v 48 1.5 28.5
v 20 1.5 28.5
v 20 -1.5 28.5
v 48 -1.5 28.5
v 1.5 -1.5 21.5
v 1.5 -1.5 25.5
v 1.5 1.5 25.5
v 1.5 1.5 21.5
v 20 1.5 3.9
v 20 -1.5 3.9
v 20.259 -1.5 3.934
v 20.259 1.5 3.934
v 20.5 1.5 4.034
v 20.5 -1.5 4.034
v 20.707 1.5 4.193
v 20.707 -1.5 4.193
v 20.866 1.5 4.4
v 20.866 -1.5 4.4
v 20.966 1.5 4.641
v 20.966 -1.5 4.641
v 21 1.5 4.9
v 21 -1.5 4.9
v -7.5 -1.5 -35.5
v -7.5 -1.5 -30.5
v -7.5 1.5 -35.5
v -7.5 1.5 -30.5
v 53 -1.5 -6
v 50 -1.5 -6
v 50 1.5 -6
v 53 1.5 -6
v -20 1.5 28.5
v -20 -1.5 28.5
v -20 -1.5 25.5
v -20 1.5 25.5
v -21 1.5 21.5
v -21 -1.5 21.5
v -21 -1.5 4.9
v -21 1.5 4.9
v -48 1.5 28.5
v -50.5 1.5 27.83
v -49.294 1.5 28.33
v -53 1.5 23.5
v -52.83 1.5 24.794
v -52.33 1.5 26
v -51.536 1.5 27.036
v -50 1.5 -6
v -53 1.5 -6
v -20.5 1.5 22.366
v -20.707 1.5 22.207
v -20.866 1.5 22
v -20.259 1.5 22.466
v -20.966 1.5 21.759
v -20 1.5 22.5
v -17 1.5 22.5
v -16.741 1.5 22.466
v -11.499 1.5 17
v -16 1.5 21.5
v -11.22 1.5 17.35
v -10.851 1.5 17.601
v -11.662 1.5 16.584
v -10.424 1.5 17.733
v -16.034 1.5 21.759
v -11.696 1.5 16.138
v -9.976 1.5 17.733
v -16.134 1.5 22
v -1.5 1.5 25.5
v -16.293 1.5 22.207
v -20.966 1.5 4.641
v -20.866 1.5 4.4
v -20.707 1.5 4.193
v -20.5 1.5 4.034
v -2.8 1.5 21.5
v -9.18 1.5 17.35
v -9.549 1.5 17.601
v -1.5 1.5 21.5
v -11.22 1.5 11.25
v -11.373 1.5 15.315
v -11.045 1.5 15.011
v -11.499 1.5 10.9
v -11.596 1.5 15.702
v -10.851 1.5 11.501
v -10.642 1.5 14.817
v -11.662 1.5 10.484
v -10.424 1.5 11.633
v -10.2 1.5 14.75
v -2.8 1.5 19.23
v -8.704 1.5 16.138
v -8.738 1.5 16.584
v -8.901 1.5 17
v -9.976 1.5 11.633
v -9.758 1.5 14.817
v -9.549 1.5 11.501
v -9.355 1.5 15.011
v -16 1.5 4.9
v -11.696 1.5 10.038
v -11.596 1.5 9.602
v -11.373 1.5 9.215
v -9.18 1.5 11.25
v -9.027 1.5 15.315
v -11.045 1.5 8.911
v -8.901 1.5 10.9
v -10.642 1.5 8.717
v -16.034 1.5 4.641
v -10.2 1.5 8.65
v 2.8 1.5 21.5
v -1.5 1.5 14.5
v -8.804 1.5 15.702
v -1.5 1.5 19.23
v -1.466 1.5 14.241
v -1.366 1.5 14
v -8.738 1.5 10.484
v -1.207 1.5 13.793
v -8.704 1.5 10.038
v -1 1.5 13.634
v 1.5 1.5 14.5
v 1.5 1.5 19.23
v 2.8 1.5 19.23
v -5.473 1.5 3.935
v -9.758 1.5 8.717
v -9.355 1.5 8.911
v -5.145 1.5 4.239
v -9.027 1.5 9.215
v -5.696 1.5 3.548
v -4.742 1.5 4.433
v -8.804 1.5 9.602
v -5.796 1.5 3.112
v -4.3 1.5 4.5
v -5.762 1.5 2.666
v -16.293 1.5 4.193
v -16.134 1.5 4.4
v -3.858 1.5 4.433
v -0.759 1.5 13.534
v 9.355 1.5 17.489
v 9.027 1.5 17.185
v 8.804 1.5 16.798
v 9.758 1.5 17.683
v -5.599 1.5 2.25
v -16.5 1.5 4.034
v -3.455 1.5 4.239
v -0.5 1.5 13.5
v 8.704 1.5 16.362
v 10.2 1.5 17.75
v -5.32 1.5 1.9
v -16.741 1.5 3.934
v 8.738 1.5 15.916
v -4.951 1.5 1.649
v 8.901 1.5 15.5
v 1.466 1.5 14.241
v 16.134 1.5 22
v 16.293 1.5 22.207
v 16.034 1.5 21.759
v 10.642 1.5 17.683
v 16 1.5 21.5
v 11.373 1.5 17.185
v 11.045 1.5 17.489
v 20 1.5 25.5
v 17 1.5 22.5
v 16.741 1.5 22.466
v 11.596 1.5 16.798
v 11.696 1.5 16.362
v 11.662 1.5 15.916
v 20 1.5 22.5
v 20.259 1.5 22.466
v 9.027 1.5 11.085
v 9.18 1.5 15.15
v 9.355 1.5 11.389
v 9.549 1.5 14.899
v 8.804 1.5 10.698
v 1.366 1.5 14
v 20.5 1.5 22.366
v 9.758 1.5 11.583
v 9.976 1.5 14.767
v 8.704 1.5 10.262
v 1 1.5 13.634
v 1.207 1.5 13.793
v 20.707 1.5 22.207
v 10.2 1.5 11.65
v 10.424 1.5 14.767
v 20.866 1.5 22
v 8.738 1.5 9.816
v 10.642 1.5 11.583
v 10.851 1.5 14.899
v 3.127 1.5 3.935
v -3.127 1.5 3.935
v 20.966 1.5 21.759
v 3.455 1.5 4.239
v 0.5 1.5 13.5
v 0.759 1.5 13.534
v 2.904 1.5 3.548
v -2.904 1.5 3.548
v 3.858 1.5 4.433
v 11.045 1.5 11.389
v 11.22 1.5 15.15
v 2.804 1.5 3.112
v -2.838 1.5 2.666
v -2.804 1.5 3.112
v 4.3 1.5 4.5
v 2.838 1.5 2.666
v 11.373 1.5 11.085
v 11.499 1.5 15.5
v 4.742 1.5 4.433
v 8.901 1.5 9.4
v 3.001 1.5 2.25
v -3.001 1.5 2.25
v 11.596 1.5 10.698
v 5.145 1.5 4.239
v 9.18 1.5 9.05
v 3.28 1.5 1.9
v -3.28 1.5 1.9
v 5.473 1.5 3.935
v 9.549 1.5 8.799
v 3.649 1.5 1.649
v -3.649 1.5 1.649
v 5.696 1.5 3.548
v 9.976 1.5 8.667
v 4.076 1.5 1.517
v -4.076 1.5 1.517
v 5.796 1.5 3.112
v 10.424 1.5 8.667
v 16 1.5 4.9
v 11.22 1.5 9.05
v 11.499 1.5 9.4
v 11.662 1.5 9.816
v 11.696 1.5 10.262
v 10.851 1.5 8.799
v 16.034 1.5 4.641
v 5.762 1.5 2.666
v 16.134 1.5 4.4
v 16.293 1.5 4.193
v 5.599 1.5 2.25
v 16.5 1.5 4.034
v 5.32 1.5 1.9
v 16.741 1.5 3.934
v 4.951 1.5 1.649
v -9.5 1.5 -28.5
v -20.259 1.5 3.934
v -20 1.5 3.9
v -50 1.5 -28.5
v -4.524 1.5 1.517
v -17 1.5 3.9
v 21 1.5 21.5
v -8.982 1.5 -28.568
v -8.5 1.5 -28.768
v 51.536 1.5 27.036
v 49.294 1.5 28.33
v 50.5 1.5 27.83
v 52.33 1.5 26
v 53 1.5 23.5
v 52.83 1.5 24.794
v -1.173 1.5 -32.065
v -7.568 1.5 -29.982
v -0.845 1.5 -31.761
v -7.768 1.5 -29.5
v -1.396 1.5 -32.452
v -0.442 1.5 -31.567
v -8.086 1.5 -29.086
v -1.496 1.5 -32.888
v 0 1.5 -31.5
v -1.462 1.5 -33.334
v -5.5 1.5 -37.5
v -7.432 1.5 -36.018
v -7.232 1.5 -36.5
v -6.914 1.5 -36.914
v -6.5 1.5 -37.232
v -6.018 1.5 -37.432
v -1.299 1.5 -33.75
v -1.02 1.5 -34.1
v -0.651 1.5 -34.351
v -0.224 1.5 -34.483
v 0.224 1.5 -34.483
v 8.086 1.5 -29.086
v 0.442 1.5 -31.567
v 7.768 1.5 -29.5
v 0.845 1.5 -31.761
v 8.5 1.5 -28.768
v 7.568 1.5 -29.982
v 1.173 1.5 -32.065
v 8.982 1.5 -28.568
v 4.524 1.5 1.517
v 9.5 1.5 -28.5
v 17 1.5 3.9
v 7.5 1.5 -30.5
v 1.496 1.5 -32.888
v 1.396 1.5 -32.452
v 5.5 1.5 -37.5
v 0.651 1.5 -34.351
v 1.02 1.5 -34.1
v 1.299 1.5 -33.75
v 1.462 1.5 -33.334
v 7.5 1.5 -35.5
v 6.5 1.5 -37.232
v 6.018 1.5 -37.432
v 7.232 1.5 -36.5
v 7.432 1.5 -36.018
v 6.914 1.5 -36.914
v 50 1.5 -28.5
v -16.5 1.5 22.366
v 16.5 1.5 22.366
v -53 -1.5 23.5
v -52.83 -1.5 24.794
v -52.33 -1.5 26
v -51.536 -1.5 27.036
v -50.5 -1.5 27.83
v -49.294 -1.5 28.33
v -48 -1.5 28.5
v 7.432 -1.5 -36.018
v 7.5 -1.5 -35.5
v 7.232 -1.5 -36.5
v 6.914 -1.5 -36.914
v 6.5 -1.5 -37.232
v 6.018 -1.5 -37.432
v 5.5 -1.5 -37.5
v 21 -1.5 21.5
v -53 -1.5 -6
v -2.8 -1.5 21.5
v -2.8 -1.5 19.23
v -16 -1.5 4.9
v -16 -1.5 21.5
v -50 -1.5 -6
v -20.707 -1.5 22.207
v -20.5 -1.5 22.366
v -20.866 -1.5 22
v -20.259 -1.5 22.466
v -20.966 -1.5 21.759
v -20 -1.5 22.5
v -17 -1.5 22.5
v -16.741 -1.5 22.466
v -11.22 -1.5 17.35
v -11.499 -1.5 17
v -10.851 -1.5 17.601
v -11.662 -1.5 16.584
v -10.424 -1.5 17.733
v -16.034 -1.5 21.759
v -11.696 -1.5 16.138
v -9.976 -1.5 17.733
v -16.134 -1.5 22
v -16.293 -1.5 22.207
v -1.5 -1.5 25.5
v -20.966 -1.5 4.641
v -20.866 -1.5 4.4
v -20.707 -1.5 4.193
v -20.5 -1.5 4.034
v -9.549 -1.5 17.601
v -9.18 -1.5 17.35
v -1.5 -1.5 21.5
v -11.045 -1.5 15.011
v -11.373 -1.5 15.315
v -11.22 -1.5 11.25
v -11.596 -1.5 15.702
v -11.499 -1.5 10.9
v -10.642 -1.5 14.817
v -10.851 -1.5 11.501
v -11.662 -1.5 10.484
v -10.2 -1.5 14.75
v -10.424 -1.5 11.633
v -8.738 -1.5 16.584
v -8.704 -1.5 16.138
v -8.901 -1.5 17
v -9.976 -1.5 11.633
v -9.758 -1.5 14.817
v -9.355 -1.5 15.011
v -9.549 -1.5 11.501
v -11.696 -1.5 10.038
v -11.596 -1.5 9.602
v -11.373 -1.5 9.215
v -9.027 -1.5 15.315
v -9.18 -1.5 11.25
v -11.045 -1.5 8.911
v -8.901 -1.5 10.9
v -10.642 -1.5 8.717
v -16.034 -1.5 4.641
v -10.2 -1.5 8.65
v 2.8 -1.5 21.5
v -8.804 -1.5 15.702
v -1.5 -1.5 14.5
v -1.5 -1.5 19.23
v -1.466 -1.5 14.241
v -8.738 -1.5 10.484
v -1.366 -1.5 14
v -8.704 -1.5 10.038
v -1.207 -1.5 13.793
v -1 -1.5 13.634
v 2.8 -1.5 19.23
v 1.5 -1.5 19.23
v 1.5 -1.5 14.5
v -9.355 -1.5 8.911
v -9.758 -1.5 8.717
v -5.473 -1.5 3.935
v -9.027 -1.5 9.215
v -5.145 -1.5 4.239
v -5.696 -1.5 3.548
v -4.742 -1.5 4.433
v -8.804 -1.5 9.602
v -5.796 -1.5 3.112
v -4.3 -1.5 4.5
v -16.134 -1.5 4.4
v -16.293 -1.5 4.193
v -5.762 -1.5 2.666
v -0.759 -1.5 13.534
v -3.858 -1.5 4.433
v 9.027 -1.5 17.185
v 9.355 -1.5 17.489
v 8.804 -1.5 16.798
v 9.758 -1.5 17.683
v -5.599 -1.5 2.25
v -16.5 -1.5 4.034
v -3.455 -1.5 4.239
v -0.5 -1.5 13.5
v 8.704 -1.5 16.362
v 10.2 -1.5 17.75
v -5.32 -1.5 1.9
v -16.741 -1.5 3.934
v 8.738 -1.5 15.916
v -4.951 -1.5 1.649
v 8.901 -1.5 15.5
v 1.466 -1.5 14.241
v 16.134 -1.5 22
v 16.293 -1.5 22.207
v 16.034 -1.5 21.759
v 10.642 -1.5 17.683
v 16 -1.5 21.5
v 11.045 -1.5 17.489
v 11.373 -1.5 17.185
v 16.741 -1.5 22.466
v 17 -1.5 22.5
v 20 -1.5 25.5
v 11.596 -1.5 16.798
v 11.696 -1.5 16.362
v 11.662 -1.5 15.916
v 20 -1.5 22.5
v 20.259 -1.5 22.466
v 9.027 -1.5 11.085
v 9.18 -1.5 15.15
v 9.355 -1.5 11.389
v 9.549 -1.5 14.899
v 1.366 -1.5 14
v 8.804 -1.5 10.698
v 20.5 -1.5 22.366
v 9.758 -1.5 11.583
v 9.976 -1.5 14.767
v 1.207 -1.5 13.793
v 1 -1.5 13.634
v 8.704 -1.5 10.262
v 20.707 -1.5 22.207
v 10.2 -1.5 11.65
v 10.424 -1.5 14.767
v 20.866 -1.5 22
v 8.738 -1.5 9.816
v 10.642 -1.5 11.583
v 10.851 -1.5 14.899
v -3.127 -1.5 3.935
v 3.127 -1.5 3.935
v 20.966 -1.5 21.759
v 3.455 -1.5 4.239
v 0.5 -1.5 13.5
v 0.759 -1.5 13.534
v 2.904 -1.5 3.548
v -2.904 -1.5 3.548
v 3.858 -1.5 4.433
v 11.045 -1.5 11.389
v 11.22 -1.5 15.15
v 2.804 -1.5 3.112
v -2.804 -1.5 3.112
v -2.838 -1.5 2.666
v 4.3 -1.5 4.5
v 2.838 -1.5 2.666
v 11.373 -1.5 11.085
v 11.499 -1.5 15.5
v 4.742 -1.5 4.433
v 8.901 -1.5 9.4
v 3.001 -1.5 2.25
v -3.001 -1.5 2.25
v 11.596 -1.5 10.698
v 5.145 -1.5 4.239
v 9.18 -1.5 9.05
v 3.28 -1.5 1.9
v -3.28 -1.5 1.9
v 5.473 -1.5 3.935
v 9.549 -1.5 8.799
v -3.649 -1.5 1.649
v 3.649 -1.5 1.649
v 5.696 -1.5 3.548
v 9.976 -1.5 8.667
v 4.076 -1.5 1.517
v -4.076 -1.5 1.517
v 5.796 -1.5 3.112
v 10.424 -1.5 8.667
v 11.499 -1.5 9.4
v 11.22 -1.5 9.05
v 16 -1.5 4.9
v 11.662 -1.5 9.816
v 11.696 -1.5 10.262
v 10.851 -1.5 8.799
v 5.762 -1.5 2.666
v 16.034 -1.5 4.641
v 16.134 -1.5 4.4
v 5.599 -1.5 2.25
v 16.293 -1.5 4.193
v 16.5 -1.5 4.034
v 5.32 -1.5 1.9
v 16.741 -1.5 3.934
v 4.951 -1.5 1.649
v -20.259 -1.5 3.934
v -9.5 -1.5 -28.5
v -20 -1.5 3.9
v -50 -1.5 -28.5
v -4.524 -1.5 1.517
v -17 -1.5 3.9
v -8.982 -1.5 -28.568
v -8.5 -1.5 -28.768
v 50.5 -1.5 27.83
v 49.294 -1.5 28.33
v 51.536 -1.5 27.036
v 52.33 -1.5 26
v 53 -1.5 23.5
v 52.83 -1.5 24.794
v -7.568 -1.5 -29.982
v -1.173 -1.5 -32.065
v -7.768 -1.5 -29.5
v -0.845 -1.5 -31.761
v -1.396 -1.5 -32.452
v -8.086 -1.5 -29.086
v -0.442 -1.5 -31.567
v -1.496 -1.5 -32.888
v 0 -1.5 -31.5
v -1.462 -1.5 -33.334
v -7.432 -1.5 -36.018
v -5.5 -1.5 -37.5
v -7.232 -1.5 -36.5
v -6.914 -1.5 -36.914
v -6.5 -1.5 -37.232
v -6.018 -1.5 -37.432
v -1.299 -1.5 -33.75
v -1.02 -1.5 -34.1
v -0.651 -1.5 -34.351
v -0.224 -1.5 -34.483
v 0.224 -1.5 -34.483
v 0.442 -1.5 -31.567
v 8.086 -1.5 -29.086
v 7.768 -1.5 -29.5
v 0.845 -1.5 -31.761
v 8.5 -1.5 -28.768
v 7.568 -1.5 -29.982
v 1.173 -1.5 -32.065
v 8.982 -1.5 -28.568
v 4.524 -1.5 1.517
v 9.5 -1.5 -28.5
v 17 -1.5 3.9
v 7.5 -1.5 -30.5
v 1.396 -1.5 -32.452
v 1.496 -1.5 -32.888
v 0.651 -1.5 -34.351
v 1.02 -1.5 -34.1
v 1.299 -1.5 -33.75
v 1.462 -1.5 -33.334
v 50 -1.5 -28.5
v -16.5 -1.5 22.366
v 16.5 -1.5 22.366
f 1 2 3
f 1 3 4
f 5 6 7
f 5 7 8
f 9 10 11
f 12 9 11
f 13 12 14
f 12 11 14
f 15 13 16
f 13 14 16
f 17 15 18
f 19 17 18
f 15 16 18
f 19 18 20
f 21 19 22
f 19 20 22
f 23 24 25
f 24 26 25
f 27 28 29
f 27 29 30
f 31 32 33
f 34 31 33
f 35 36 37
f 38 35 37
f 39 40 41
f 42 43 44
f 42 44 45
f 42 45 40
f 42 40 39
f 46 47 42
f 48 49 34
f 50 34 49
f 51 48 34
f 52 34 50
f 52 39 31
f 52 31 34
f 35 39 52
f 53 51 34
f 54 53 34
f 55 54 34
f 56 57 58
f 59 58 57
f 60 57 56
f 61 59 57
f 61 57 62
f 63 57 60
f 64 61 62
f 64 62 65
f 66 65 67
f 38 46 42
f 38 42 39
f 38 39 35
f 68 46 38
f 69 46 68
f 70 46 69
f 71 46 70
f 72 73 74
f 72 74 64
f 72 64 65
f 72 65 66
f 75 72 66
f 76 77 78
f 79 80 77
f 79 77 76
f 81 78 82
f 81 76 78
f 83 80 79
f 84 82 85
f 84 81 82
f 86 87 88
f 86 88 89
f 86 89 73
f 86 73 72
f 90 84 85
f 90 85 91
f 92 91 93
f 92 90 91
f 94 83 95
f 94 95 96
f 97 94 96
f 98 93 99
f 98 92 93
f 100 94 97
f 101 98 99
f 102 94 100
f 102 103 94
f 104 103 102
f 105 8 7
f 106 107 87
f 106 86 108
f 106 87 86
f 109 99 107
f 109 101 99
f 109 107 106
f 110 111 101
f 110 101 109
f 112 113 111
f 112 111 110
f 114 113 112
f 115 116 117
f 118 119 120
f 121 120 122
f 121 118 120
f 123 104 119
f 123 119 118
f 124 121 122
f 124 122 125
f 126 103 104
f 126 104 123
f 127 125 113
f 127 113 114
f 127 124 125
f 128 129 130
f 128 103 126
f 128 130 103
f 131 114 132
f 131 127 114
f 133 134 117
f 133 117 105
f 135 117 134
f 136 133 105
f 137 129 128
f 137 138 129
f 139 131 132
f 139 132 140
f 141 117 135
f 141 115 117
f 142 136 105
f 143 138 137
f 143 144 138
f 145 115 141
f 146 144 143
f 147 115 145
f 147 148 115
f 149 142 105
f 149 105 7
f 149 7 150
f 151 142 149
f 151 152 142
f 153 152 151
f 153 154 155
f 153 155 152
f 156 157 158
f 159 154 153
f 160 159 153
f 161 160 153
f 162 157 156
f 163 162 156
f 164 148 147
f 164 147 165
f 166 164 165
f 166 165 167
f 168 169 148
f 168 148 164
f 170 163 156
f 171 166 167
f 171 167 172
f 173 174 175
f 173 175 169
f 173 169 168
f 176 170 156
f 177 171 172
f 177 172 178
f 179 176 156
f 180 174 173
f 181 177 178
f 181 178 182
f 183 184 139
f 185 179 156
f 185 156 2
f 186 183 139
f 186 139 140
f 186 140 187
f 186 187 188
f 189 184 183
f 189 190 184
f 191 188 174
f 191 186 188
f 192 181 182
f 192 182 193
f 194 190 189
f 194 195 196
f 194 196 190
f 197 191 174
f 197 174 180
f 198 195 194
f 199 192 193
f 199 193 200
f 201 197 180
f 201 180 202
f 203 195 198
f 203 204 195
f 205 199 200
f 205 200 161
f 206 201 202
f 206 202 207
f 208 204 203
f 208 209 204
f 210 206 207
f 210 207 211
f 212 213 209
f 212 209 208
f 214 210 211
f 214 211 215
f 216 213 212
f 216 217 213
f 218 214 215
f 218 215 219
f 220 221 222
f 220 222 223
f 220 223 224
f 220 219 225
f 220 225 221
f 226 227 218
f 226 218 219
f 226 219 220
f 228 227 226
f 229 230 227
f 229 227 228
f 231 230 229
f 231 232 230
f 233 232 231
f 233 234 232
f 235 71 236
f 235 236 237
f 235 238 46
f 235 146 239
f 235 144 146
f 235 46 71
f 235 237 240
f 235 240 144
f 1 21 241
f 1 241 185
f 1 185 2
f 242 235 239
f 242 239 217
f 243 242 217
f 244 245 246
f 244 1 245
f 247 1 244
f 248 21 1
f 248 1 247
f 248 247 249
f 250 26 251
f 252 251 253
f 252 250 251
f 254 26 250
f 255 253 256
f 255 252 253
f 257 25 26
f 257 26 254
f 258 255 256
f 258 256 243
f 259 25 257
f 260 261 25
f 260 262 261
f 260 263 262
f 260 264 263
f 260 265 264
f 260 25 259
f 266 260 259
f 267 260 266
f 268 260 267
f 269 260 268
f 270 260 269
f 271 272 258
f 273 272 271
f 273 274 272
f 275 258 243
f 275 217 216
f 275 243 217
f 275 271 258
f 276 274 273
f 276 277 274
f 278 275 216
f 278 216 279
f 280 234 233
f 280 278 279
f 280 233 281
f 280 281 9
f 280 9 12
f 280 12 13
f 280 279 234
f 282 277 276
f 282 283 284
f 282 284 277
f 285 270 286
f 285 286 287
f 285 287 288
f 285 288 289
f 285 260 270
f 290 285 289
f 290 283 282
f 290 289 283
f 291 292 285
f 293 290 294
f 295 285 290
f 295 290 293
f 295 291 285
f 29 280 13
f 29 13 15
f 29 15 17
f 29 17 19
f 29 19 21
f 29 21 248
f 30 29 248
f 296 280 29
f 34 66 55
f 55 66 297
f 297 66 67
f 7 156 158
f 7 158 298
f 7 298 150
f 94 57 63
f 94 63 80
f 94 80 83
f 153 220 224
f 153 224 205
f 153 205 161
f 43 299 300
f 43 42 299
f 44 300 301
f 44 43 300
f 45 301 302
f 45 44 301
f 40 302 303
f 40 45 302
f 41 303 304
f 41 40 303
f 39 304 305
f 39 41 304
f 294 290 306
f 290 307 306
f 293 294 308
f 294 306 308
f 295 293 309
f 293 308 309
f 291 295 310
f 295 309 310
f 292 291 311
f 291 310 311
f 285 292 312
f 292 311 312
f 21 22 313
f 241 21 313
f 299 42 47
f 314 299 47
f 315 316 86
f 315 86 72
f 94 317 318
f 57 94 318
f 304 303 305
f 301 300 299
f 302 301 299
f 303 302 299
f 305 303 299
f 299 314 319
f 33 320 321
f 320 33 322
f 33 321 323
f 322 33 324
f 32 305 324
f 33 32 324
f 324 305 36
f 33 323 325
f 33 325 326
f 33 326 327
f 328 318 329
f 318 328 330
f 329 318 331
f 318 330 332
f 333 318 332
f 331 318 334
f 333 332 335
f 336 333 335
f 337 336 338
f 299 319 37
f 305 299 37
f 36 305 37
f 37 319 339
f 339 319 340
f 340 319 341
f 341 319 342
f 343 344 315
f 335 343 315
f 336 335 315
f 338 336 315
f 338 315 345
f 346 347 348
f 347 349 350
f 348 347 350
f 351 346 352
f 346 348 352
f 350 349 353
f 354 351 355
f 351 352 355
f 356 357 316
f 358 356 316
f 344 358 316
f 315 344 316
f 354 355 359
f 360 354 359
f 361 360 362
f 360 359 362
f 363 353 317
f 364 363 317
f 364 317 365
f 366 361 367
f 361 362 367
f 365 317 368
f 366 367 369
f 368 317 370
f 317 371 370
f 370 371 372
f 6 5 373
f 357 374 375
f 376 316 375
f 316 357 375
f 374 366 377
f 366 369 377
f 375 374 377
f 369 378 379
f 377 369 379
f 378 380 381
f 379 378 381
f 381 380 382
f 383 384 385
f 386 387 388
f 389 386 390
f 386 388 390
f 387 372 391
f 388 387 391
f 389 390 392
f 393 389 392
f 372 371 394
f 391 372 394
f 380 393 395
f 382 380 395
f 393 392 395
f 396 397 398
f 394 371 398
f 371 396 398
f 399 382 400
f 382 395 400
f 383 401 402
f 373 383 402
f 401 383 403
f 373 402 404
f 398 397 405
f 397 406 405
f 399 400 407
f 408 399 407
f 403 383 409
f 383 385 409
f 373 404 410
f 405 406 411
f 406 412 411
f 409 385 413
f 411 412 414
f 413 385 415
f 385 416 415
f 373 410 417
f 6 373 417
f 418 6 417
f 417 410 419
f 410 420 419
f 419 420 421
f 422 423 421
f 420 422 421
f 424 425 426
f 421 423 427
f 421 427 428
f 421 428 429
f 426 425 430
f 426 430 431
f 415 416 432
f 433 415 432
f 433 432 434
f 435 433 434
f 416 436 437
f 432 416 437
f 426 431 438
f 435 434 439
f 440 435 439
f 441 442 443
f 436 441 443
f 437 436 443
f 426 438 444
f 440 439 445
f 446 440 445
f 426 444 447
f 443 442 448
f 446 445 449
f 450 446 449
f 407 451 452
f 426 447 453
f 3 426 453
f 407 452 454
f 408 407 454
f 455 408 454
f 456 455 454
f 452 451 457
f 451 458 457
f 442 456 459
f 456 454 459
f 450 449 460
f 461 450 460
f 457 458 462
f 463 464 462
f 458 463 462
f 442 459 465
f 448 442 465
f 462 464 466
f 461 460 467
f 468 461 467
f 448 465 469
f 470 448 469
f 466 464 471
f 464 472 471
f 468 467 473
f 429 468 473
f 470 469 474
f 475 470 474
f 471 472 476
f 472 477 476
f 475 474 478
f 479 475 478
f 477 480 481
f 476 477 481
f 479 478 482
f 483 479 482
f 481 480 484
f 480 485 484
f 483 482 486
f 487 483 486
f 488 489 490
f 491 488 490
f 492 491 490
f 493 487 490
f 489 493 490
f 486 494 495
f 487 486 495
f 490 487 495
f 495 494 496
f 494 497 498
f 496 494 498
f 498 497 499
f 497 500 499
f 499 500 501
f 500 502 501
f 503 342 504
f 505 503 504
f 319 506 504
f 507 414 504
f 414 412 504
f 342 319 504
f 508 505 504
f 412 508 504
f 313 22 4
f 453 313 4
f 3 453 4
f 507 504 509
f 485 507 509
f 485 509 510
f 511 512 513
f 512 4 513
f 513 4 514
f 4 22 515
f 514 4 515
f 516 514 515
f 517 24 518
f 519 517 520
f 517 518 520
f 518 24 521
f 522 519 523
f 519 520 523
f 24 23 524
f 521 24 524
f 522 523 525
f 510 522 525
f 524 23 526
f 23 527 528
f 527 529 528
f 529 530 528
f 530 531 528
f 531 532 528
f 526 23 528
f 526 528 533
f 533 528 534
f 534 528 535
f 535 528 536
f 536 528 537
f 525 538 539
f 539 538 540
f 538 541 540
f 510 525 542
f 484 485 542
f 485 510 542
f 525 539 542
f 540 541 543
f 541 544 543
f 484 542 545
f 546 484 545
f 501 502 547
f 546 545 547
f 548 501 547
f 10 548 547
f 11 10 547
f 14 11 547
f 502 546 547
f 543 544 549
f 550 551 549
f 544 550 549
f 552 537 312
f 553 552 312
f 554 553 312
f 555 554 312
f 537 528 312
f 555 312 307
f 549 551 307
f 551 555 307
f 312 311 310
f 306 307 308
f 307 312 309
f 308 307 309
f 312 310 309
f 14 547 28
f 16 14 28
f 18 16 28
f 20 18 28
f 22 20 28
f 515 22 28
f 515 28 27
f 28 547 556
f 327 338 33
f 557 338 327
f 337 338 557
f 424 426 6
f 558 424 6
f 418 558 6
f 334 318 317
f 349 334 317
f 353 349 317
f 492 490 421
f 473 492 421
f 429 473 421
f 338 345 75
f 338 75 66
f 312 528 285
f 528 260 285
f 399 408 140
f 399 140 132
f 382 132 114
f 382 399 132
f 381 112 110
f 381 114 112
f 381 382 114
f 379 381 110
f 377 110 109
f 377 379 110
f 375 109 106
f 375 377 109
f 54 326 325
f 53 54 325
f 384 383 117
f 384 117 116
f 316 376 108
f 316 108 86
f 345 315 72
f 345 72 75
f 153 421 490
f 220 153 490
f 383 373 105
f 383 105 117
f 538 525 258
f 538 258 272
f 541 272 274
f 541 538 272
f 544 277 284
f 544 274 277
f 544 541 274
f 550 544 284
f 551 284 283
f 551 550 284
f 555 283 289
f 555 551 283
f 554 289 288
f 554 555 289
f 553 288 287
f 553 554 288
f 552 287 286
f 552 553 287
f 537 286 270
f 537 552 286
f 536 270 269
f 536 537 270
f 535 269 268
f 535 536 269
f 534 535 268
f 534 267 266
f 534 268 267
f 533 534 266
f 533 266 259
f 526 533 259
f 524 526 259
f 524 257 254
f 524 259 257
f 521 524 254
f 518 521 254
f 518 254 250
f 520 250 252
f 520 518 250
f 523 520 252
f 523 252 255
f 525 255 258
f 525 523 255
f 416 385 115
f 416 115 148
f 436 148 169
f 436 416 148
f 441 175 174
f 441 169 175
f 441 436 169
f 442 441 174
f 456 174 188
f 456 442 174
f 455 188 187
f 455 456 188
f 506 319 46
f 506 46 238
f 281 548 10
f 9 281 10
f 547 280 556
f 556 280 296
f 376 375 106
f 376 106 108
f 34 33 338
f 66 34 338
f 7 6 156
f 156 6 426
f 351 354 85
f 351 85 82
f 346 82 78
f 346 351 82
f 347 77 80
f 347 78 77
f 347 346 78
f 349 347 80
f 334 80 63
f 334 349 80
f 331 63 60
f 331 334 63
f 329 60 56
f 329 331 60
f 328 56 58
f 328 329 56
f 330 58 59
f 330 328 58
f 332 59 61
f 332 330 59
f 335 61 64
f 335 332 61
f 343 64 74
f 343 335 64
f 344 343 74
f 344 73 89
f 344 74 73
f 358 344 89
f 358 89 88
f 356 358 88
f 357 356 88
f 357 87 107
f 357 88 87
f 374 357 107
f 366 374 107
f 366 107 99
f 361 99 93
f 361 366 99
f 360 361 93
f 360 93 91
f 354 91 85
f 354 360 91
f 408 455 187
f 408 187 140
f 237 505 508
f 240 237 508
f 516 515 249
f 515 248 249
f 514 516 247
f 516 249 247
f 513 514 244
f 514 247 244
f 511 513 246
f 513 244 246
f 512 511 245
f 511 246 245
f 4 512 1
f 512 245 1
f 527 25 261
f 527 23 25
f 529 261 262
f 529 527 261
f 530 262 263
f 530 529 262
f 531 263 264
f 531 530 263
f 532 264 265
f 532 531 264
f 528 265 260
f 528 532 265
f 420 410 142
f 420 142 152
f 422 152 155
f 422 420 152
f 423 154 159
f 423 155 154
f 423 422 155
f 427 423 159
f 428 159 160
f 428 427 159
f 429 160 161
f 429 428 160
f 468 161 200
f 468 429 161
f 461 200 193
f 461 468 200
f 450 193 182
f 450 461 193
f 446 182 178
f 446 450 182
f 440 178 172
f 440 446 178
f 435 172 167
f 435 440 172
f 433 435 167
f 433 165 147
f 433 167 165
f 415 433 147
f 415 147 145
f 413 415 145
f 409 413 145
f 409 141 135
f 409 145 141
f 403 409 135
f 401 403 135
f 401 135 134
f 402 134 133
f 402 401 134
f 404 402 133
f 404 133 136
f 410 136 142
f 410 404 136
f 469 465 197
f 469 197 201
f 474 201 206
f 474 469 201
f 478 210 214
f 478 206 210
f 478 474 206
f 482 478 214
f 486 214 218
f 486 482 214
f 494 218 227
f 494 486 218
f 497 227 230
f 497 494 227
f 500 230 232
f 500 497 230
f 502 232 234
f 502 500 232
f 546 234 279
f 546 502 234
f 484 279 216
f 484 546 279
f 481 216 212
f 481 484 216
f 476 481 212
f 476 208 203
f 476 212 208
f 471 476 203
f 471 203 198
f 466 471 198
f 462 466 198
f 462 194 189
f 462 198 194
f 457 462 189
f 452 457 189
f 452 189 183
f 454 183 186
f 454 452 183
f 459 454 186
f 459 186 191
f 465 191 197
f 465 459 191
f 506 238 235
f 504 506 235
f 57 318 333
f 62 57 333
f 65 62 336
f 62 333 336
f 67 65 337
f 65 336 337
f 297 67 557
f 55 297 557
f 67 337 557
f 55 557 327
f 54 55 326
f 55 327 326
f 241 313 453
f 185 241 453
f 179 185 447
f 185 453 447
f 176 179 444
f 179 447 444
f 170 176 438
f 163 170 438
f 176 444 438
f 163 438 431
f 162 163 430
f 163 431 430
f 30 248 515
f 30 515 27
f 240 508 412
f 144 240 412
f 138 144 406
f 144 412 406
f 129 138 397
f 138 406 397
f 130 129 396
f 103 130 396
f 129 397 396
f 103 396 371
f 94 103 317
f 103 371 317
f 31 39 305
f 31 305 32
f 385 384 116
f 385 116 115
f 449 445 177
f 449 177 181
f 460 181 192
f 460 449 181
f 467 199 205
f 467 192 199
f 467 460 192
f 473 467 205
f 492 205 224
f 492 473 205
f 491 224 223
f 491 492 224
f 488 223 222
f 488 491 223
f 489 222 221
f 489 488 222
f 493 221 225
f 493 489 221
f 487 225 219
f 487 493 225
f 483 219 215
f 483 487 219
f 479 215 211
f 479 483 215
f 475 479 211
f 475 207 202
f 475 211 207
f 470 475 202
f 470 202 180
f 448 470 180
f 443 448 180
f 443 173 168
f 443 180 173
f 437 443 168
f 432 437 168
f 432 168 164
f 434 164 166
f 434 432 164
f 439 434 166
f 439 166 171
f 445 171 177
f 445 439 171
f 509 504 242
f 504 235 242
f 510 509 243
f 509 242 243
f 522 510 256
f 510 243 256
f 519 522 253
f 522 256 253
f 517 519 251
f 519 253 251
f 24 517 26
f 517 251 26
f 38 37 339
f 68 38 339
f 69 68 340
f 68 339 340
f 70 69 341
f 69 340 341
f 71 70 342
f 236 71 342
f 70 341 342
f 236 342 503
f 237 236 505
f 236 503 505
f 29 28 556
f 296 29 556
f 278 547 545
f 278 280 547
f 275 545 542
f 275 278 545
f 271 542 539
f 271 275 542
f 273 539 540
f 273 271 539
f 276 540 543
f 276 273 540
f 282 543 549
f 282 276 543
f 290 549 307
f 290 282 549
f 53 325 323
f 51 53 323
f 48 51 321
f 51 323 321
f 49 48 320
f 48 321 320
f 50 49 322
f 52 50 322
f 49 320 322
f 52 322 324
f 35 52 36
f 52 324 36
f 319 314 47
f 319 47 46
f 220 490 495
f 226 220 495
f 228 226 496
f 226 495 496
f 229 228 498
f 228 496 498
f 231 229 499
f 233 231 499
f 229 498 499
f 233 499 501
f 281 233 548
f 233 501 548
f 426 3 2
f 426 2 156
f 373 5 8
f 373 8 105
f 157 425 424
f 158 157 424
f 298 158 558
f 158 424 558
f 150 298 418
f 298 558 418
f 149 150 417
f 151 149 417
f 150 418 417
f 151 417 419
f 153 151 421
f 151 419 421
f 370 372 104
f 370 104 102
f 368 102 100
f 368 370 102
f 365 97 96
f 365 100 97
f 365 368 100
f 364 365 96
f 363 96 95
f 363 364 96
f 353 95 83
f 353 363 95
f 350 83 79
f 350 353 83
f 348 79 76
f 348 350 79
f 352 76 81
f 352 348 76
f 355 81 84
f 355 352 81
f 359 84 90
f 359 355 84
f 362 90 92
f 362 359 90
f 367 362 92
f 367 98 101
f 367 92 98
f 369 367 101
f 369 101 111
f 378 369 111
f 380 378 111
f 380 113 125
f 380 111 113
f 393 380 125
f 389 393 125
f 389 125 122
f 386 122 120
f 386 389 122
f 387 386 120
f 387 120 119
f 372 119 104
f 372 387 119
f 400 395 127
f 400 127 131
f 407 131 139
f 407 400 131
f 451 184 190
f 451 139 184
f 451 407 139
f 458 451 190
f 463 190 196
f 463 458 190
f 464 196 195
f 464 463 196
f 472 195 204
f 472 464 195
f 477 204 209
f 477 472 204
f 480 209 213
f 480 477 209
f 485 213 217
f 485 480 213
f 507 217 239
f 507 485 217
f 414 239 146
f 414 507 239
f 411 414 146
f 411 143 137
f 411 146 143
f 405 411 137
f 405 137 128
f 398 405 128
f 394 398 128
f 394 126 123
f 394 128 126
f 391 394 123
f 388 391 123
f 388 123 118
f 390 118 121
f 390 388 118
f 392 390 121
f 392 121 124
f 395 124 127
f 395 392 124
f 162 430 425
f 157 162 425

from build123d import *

# Parameters (mm, degrees)
SKETCH1_W                  = 106
SKETCH1_H                  = 57
BOSS_EXTRUDE1_DEPTH        = 1.5
CUT_EXTRUDE1_DEPTH         = 61.195514783
CUT_EXTRUDE1_DEPTH_BACK    = 61.195514783
SKETCH2_W                  = 3
SKETCH2_H                  = 22.5
SKETCH2_W_2                = 40
SKETCH2_H_2                = 3
SKETCH4_W                  = 15
SKETCH4_H                  = 9
BOSS_EXTRUDE2_DEPTH        = 1.5
FILLET1_R                  = 2
CUT_EXTRUDE2_DEPTH         = 65.942282066
CUT_EXTRUDE2_DEPTH_BACK    = 65.942282066
CUT_EXTRUDE3_DEPTH         = 65.942282066
CUT_EXTRUDE3_DEPTH_BACK    = 65.942282066
SKETCH5_R                  = 1.5
FILLET2_R                  = 5
CUT_EXTRUDE4_DEPTH         = 65.942282066
CUT_EXTRUDE4_DEPTH_BACK    = 65.942282066
SKETCH6_R                  = 1.5
CORTE_EXTRUS_O1_DEPTH      = 65.994230513
CORTE_EXTRUS_O1_DEPTH_BACK = 65.994230513


with BuildPart() as part:
    # Sketch1 → Boss-Extrude1 (new, symmetric)
    with BuildSketch(Plane(origin=(0, 0, 0), x_dir=(1, 0, 0), z_dir=(0, 1, 0))):
        Rectangle(SKETCH1_W, SKETCH1_H)
    extrude(amount=BOSS_EXTRUDE1_DEPTH, both=True)

    # Sketch2 → Cut-Extrude1 (cut, two sides: drawn at the far end of the back side and taken through both)
    with BuildSketch(Plane(origin=(0, 0, 0), x_dir=(1, 0, 0), z_dir=(0, 1, 0)).offset(-CUT_EXTRUDE1_DEPTH_BACK)):
        with Locations((-51.5, 17.25)):
            Rectangle(SKETCH2_W, SKETCH2_H)
        with Locations((51.5, 17.25)):
            Rectangle(SKETCH2_W, SKETCH2_H)
        with Locations((0, -27)):
            Rectangle(SKETCH2_W_2, SKETCH2_H_2)
    extrude(amount=CUT_EXTRUDE1_DEPTH + CUT_EXTRUDE1_DEPTH_BACK, mode=Mode.SUBTRACT)

    # Sketch4 → Boss-Extrude2 (add, symmetric)
    with BuildSketch(Plane(origin=(0, 0, 0), x_dir=(1, 0, 0), z_dir=(0, 1, 0))):
        with Locations((0, 33)):
            Rectangle(SKETCH4_W, SKETCH4_H)
    extrude(amount=BOSS_EXTRUDE2_DEPTH, both=True)

    # Fillet1
    fillet1_edges = [part.edges().sort_by_distance(p)[0] for p in [
        (-7.5, 0, -37.5),
        (-7.5, 0, -28.5),
        (7.5, 0, -28.5),
        (7.5, 0, -37.5),
    ]]
    fillet(fillet1_edges, radius=FILLET1_R)

    # Sketch3 → Cut-Extrude2 (cut, two sides: drawn at the far end of the back side and taken through both)
    with BuildSketch(Plane(origin=(0, 0, 0), x_dir=(1, 0, 0), z_dir=(0, 1, 0)).offset(-CUT_EXTRUDE2_DEPTH_BACK)):
        with BuildLine():
            Line((-1.5, -25.5), (1.5, -25.5))
            Line((1.5, -25.5), (1.5, -21.5))
            Line((1.5, -21.5), (2.8, -21.5))
            Line((2.8, -21.5), (2.8, -19.23))
            Line((2.8, -19.23), (1.5, -19.23))
            Line((1.5, -19.23), (1.5, -14.5))
            ThreePointArc((1.5, -14.5), (1.207106781, -13.792893219), (0.5, -13.5))
            Line((0.5, -13.5), (-0.5, -13.5))
            ThreePointArc((-0.5, -13.5), (-1.207106781, -13.792893219), (-1.5, -14.5))
            Line((-1.5, -14.5), (-1.5, -19.23))
            Line((-1.5, -19.23), (-2.8, -19.23))
            Line((-2.8, -19.23), (-2.8, -21.5))
            Line((-2.8, -21.5), (-1.5, -21.5))
            Line((-1.5, -21.5), (-1.5, -25.5))
        make_face()
    extrude(amount=CUT_EXTRUDE2_DEPTH + CUT_EXTRUDE2_DEPTH_BACK, mode=Mode.SUBTRACT)

    # Sketch5 → Cut-Extrude3 (cut, two sides: drawn at the far end of the back side and taken through both)
    with BuildSketch(Plane(origin=(0, 0, 0), x_dir=(1, 0, 0), z_dir=(0, 1, 0)).offset(-CUT_EXTRUDE3_DEPTH_BACK)):
        with Locations(Location((0, 33, 0), (0, 0, 270))):
            Circle(SKETCH5_R)
    extrude(amount=CUT_EXTRUDE3_DEPTH + CUT_EXTRUDE3_DEPTH_BACK, mode=Mode.SUBTRACT)

    # Fillet2
    fillet2_edges = [part.edges().sort_by_distance(p)[0] for p in [
        (53, 0, 28.5),
        (-53, 0, 28.5),
    ]]
    fillet(fillet2_edges, radius=FILLET2_R)

    # Sketch6 → Cut-Extrude4 (cut, two sides: drawn at the far end of the back side and taken through both)
    with BuildSketch(Plane(origin=(0, 0, 0), x_dir=(1, 0, 0), z_dir=(0, 1, 0)).offset(-CUT_EXTRUDE4_DEPTH_BACK)):
        with Locations(Location((-4.3, -3, 0), (0, 0, 270))):
            Circle(SKETCH6_R)
        with Locations(Location((4.3, -3, 0), (0, 0, 270))):
            Circle(SKETCH6_R)
        with Locations(Location((10.2, -10.15, 0), (0, 0, 270))):
            Circle(SKETCH6_R)
        with Locations(Location((10.2, -16.25, 0), (0, 0, 270))):
            Circle(SKETCH6_R)
        with Locations(Location((-10.2, -16.25, 0), (0, 0, 90))):
            Circle(SKETCH6_R)
        with Locations(Location((-10.2, -10.15, 0), (0, 0, 90))):
            Circle(SKETCH6_R)
    extrude(amount=CUT_EXTRUDE4_DEPTH + CUT_EXTRUDE4_DEPTH_BACK, mode=Mode.SUBTRACT)

    # Esboço1 → Corte-extrusão1 (cut, two sides: drawn at the far end of the back side and taken through both)
    with BuildSketch(Plane(origin=(0, 1.5, 0), x_dir=(1, 0, 0), z_dir=(0, 1, 0)).offset(-CORTE_EXTRUS_O1_DEPTH_BACK)):
        with BuildLine():
            Line((-20, -3.9), (-17, -3.9))
            ThreePointArc((-17, -3.9), (-16.292893219, -4.192893219), (-16, -4.9))
            Line((-16, -4.9), (-16, -21.5))
            ThreePointArc((-16, -21.5), (-16.292893219, -22.207106781), (-17, -22.5))
            Line((-17, -22.5), (-20, -22.5))
            ThreePointArc((-20, -22.5), (-20.707106781, -22.207106781), (-21, -21.5))
            Line((-21, -21.5), (-21, -4.9))
            ThreePointArc((-21, -4.9), (-20.707106781, -4.192893219), (-20, -3.9))
        make_face()
        with BuildLine():
            Line((21, -4.9), (21, -21.5))
            ThreePointArc((21, -21.5), (20.707106781, -22.207106781), (20, -22.5))
            Line((20, -22.5), (17, -22.5))
            ThreePointArc((17, -22.5), (16.292893219, -22.207106781), (16, -21.5))
            Line((16, -21.5), (16, -4.9))
            ThreePointArc((16, -4.9), (16.292893219, -4.192893219), (17, -3.9))
            Line((17, -3.9), (20, -3.9))
            ThreePointArc((20, -3.9), (20.707106781, -4.192893219), (21, -4.9))
        make_face()
    extrude(amount=CORTE_EXTRUS_O1_DEPTH + CORTE_EXTRUS_O1_DEPTH_BACK, mode=Mode.SUBTRACT)


solid = part.part
